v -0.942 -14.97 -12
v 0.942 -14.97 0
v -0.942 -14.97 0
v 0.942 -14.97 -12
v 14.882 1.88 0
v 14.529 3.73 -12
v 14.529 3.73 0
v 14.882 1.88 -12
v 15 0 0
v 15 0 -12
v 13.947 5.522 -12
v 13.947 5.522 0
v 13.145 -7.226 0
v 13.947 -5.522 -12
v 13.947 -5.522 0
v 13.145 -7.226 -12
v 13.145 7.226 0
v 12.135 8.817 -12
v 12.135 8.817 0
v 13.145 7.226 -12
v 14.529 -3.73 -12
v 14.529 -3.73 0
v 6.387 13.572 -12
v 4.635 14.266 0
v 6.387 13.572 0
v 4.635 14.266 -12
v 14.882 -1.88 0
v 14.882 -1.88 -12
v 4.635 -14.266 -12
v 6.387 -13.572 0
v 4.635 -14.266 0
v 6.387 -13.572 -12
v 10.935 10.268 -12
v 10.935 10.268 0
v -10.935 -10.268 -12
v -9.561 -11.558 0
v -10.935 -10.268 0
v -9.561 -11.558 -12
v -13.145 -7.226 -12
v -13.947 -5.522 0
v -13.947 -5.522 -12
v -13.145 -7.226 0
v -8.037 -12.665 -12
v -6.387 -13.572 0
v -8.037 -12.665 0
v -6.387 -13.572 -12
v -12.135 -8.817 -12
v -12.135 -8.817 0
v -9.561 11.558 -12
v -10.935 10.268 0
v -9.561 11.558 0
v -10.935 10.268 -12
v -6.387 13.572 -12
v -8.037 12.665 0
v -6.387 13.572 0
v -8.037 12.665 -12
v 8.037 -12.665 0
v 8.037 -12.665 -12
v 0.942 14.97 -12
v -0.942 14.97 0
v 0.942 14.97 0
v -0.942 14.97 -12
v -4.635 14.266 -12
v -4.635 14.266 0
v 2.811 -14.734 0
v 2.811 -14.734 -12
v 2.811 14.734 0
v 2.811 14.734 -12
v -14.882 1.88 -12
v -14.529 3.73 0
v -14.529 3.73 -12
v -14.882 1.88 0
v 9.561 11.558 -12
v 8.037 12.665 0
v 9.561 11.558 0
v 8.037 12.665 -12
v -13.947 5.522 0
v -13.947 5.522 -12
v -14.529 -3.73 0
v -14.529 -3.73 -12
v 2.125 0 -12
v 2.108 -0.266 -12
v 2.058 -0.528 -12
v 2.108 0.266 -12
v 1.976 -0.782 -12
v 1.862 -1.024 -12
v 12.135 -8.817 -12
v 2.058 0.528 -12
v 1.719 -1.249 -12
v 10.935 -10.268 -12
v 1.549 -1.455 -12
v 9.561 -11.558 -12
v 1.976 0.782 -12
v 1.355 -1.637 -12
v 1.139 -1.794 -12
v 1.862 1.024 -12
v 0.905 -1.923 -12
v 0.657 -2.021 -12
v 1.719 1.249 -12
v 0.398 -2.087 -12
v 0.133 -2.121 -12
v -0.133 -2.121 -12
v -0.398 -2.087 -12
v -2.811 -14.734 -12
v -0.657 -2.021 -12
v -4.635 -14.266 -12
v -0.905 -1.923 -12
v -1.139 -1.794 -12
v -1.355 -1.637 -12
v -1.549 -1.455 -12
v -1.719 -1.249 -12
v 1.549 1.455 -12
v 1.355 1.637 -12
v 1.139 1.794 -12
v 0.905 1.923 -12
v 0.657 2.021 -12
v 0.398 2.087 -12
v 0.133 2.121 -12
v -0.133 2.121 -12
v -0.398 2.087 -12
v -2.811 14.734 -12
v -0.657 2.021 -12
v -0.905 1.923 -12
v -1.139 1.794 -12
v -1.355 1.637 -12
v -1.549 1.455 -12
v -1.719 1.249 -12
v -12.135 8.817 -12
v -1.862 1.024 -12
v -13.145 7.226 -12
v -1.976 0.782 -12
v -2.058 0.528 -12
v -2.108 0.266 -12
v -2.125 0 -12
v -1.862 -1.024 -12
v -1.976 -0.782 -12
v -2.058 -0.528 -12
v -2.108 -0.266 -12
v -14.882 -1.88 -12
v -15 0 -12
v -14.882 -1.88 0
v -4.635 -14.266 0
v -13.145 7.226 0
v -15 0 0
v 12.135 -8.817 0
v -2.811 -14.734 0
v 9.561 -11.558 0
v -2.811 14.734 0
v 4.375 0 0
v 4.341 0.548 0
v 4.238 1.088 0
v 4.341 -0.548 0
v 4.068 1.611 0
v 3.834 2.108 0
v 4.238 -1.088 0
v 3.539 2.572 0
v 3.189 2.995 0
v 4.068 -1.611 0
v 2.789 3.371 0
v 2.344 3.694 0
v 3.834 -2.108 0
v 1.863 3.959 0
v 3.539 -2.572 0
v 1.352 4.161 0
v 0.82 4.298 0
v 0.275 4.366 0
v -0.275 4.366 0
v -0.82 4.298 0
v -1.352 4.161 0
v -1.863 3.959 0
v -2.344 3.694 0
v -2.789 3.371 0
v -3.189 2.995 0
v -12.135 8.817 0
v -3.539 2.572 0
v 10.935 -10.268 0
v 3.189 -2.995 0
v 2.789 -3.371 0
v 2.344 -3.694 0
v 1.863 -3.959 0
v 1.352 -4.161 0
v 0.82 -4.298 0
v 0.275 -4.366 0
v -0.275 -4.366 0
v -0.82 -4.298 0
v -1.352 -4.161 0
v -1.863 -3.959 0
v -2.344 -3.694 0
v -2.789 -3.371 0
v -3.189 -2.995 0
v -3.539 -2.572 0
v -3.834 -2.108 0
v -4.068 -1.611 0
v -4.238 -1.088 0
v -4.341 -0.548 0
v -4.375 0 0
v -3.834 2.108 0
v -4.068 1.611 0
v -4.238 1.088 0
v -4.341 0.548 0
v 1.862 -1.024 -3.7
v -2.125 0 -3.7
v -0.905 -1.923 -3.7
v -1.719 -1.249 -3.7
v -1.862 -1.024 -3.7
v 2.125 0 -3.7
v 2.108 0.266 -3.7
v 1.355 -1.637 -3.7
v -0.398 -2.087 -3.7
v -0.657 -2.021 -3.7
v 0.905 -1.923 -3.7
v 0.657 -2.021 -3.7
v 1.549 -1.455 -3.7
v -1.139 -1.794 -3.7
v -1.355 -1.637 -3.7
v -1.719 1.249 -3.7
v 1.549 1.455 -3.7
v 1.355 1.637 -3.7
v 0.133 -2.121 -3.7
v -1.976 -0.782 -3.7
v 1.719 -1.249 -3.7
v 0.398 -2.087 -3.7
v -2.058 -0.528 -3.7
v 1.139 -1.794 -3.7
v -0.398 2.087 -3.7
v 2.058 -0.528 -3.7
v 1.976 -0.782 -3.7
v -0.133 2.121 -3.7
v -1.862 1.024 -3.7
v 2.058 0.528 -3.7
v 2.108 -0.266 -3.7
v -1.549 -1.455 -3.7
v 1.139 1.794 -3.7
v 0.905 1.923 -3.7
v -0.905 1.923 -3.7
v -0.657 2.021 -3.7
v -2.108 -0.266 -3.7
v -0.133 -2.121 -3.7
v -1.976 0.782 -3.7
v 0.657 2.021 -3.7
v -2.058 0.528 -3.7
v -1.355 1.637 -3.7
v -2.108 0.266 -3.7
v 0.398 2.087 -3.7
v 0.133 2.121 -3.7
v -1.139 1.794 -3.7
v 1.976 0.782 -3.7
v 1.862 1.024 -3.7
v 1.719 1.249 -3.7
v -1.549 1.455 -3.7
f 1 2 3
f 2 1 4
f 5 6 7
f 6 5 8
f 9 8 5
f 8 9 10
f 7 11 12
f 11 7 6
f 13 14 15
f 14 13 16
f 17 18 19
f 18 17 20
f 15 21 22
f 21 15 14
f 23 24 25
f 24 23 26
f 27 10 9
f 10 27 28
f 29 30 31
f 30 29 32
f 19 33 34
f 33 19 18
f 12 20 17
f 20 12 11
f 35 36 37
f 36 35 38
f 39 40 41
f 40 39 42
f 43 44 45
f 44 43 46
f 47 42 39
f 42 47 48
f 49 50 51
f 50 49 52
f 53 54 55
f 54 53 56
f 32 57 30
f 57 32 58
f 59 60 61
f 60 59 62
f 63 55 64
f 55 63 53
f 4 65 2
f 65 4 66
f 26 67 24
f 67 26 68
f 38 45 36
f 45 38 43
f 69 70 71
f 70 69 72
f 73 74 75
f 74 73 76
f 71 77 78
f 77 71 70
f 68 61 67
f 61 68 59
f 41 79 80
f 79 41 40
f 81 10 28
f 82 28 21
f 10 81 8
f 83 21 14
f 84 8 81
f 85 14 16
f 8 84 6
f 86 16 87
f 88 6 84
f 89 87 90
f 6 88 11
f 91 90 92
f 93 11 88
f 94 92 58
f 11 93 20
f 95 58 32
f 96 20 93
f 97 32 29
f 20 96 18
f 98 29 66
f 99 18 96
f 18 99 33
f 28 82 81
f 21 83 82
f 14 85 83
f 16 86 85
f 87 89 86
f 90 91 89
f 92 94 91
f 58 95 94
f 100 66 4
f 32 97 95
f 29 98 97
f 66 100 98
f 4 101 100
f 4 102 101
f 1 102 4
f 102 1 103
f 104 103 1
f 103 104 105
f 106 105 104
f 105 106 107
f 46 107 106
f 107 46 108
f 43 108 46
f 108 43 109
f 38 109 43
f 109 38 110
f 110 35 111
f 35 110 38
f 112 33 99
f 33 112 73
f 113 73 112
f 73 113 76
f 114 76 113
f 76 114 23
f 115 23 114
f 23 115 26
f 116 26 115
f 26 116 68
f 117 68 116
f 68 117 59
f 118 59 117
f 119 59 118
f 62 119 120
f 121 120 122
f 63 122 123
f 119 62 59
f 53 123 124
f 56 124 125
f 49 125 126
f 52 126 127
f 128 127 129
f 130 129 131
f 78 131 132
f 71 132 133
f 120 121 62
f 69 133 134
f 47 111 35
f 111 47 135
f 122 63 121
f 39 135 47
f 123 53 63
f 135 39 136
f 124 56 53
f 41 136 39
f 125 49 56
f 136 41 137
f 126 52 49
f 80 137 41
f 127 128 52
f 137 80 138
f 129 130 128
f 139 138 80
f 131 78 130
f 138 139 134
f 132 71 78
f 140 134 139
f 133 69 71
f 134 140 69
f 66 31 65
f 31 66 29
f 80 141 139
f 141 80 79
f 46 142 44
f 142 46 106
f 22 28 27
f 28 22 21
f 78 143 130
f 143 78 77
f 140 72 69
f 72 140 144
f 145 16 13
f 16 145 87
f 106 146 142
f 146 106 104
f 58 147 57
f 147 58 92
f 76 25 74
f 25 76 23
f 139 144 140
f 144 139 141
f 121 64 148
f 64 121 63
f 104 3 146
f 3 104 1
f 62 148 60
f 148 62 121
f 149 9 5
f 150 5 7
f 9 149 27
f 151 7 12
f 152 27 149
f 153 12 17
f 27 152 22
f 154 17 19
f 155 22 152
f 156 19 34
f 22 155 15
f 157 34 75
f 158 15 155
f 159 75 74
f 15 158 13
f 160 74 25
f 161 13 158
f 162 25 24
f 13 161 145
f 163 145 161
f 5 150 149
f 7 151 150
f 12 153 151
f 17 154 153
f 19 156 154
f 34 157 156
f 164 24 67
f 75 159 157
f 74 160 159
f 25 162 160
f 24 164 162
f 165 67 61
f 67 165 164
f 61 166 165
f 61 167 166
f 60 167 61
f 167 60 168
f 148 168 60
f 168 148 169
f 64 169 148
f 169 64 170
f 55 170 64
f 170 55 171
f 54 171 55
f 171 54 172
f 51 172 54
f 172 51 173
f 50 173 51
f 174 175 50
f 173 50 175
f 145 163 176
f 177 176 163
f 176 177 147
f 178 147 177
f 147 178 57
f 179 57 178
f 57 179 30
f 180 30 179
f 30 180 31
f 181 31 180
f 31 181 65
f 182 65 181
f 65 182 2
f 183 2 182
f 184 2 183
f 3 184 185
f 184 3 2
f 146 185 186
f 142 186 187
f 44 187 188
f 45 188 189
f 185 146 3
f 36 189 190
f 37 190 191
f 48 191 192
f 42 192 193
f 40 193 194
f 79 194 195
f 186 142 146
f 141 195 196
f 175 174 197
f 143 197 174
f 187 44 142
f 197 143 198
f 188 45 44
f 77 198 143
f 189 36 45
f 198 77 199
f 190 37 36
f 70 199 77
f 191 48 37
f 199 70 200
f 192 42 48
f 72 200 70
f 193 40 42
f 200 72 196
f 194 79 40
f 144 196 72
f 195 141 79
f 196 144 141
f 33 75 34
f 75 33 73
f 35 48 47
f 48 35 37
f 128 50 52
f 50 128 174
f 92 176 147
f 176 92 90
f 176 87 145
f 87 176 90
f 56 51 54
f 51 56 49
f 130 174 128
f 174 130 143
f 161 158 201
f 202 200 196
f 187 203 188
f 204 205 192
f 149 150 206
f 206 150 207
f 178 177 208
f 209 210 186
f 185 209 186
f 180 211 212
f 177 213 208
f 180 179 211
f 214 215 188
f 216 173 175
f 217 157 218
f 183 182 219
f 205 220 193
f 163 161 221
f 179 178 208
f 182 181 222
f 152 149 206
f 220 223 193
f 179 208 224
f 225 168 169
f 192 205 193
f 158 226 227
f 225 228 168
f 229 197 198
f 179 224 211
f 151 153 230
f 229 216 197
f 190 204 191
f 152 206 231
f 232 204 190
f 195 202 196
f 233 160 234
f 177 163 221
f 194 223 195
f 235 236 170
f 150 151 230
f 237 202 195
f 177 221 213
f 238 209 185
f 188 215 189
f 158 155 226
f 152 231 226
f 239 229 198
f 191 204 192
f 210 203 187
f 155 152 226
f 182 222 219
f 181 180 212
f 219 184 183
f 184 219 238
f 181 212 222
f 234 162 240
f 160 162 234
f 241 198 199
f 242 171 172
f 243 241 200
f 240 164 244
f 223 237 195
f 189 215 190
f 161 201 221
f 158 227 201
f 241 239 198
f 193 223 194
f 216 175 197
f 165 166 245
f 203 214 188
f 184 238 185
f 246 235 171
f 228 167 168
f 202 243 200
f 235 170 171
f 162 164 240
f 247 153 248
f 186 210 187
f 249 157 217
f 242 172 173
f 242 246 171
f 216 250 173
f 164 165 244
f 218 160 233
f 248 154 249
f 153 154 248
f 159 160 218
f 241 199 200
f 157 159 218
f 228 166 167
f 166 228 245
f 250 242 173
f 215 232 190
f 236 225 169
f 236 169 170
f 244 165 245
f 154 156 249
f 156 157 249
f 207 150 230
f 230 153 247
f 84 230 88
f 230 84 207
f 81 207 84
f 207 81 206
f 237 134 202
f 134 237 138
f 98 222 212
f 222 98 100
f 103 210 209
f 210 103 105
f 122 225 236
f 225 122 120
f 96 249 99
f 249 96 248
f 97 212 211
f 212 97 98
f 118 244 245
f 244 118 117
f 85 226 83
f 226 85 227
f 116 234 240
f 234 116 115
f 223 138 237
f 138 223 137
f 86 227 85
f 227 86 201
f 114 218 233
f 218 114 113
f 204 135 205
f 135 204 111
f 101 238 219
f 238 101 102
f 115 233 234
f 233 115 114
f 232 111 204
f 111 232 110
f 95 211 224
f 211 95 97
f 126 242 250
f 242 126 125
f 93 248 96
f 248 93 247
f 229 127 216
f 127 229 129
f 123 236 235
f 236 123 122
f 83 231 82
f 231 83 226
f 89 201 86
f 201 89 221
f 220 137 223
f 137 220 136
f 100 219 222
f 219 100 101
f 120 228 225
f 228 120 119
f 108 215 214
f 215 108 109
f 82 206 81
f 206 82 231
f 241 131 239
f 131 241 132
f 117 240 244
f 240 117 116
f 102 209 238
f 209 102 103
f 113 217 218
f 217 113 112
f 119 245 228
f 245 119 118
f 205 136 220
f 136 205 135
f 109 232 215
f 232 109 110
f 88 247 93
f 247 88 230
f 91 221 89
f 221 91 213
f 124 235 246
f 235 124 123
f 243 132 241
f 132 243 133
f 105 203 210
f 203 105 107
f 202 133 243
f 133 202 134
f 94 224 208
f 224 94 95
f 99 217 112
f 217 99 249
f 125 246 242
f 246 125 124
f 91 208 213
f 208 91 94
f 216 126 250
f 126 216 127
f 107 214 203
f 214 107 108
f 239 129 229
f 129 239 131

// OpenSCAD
$fn = 50;


difference() {
	union() {
		translate(v = [0, 0, -12.0000000000]) {
			cylinder(h = 12, r = 15.0000000000);
		}
		translate(v = [0, 0, -12.0000000000]) {
			cylinder(h = 12, r = 2.8750000000);
		}
	}
	union() {
		translate(v = [0, 0, 0]) {
			rotate(a = [0, 0, 0]) {
				difference() {
					union() {
						translate(v = [0, 0, -12.0000000000]) {
							cylinder(h = 12, r = 2.0000000000);
						}
						translate(v = [0, 0, -3.7000000000]) {
							cylinder(h = 3.7000000000, r1 = 2.1250000000, r2 = 4.3750000000);
						}
						translate(v = [0, 0, -12.0000000000]) {
							cylinder(h = 12, r = 2.1250000000);
						}
						translate(v = [0, 0, -12.0000000000]) {
							cylinder(h = 12, r = 2.0000000000);
						}
					}
					union();
				}
			}
		}
	}
}
